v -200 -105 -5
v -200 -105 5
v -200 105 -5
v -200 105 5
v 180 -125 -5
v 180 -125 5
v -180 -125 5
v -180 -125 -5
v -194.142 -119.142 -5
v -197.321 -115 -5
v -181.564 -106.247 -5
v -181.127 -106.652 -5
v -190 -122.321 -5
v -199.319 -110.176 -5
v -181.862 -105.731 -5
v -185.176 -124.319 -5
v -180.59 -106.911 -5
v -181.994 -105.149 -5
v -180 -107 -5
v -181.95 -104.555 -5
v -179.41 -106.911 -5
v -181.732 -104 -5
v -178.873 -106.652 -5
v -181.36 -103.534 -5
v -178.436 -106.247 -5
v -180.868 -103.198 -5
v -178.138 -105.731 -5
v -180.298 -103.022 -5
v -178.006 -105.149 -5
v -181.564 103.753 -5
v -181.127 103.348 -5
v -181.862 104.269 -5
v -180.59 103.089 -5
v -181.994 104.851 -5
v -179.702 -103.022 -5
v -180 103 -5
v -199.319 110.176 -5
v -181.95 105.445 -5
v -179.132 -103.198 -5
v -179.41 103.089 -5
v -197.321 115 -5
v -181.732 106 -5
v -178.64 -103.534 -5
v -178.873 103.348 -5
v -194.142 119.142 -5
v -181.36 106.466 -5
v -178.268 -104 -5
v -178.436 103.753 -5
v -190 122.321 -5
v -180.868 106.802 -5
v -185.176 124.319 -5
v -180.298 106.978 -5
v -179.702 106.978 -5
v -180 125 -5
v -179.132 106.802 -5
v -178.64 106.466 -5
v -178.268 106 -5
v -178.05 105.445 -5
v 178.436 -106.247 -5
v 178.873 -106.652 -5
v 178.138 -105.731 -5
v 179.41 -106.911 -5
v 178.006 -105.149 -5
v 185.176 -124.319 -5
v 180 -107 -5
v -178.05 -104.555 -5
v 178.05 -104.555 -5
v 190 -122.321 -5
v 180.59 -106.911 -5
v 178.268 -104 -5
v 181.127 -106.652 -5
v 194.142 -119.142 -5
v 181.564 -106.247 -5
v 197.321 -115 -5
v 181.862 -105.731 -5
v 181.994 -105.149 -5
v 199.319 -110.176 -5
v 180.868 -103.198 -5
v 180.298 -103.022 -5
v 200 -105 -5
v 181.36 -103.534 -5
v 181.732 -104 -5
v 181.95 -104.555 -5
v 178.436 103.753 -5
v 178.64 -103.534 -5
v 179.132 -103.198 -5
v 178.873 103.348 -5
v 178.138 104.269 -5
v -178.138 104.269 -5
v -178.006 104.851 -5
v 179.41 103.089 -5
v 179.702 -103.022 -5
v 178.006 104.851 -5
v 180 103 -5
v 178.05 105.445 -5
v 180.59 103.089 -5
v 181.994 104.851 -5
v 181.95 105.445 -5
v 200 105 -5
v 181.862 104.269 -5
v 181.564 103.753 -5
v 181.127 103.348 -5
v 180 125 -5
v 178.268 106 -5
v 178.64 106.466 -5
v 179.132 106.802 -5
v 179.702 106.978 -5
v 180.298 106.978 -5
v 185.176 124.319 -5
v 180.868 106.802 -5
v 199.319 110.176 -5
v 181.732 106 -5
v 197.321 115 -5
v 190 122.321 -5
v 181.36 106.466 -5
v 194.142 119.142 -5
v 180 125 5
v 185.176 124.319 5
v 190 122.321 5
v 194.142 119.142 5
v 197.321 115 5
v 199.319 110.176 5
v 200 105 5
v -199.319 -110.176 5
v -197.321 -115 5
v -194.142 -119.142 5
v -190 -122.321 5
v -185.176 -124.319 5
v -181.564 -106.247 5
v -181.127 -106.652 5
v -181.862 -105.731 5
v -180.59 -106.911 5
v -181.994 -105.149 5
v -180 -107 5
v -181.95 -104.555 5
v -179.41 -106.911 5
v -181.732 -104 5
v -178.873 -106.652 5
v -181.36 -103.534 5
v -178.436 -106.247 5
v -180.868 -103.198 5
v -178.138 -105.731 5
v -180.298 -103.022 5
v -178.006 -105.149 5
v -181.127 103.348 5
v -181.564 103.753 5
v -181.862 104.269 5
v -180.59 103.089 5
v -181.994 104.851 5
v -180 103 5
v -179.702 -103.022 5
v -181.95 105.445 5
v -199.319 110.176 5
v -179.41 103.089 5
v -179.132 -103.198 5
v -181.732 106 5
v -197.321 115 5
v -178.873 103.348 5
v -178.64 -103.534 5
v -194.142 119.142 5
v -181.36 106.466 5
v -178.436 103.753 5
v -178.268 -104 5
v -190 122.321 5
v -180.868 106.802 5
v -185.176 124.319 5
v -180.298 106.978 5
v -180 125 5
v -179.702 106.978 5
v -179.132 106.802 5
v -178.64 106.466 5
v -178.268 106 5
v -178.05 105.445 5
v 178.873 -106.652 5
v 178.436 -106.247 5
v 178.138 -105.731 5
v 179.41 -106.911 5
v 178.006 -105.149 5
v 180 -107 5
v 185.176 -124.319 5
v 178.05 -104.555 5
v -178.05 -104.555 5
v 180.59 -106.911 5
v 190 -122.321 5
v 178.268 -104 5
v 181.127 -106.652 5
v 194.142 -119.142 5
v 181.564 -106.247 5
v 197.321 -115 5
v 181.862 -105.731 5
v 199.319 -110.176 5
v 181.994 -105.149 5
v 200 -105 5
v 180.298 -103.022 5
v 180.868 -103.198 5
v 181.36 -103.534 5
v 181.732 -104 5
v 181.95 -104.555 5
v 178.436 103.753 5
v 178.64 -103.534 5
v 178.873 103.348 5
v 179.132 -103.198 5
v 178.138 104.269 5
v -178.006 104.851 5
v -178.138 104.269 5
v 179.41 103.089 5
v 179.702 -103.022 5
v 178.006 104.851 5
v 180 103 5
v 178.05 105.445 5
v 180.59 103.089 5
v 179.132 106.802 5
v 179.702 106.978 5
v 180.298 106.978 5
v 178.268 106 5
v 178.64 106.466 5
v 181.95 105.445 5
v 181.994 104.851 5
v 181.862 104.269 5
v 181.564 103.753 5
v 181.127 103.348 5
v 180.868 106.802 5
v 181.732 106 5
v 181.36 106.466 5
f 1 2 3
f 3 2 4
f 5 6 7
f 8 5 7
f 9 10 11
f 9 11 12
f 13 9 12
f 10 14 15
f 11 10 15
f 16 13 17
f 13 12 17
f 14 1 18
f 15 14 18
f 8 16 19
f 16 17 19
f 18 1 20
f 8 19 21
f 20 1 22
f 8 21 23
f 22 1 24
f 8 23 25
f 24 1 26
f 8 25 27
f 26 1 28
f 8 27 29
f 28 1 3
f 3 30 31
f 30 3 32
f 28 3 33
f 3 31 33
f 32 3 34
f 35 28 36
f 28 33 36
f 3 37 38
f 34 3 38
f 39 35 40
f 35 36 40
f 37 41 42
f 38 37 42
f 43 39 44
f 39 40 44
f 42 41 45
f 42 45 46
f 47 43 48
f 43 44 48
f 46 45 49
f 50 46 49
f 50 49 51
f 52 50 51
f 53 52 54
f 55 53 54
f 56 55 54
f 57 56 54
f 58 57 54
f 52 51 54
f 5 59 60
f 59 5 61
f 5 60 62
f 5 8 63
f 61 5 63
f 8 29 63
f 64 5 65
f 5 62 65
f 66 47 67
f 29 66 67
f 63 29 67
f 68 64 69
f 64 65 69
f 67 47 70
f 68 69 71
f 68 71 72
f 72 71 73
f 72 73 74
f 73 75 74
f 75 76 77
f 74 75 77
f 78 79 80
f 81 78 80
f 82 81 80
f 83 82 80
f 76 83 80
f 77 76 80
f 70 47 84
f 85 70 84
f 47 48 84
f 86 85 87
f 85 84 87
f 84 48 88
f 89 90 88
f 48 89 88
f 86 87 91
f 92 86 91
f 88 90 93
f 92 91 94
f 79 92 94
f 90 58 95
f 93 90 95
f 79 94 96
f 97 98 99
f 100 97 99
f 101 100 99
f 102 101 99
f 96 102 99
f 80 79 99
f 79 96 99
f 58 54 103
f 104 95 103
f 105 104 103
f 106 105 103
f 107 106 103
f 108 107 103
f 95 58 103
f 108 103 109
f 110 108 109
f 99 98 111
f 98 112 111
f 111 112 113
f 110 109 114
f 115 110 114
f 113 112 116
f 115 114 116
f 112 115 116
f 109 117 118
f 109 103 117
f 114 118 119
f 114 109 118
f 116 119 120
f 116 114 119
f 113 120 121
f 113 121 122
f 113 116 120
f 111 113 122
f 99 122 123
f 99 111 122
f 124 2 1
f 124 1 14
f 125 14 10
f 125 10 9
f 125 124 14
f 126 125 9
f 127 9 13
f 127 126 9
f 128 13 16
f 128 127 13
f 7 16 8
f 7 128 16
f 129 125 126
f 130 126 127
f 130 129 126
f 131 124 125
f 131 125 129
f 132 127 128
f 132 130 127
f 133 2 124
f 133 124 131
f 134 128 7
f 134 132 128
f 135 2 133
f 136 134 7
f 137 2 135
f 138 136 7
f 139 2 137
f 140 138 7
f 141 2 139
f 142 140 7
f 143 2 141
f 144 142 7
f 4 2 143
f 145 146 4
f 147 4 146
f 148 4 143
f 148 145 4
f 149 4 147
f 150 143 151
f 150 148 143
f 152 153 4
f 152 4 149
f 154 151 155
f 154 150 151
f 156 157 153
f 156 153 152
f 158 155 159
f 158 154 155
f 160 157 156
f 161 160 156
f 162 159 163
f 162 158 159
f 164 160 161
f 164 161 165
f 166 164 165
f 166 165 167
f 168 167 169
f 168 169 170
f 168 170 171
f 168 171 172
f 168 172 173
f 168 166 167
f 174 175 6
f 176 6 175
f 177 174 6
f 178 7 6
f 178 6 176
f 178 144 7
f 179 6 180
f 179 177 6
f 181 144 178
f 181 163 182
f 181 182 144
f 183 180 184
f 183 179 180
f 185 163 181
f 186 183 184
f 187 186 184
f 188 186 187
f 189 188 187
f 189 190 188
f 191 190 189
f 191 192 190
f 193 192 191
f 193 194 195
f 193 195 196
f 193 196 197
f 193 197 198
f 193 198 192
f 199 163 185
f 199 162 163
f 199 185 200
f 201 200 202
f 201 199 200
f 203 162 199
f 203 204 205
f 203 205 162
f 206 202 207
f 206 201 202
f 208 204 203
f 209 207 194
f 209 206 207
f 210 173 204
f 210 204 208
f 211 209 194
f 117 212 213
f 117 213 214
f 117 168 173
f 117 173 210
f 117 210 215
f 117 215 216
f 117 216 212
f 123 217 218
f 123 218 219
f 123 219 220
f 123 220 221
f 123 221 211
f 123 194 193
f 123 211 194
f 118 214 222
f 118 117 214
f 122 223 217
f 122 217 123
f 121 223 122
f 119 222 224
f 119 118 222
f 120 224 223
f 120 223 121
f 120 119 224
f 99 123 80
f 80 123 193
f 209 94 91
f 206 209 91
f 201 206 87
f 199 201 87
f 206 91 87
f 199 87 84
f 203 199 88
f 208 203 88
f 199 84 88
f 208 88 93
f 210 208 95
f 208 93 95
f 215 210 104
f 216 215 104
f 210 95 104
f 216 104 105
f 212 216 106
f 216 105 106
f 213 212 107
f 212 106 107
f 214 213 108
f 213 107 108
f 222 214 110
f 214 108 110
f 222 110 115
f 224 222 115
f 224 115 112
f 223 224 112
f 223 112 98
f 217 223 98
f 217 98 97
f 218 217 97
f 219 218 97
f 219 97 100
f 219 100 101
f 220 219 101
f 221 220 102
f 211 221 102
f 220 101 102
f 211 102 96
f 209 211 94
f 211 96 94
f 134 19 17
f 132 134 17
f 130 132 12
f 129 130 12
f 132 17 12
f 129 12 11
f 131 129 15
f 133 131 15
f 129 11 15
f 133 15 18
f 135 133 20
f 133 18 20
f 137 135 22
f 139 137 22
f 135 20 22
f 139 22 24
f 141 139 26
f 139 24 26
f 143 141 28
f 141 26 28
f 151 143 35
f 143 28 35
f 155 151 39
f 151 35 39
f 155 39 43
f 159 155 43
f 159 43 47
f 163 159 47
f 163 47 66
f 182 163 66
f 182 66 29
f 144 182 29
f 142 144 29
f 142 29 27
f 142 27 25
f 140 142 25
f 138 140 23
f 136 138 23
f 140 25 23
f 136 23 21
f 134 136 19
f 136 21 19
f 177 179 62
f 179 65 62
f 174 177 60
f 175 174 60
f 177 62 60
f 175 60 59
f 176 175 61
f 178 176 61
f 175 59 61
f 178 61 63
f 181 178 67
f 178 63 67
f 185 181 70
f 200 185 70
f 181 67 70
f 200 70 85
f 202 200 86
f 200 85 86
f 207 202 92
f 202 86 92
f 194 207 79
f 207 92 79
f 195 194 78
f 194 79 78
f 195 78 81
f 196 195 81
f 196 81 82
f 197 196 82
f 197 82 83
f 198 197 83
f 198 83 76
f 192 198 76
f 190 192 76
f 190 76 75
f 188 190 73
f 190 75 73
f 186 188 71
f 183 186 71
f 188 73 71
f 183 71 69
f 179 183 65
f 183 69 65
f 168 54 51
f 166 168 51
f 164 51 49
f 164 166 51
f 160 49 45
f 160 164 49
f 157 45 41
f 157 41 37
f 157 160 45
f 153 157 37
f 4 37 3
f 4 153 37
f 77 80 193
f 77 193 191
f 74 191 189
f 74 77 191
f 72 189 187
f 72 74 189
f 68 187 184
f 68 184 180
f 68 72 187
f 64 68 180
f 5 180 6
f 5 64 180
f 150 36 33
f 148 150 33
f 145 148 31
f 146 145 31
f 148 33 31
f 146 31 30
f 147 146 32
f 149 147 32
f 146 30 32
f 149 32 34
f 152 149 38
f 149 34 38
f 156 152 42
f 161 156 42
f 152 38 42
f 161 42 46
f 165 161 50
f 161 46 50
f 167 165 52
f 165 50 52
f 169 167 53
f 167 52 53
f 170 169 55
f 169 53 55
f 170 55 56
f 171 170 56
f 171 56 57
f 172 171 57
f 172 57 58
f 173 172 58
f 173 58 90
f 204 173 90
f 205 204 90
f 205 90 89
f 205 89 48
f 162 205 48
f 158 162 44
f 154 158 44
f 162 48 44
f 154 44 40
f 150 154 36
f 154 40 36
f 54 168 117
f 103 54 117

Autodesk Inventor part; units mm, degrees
ref_plane "YZ Plane" through (0, 0, 0) normal (1, 0, 0) x (0, 1, 0)
ref_plane "XZ Plane" through (0, 0, 0) normal (0, 1, 0) x (-1, 0, 0)
ref_plane "XY Plane" through (0, 0, 0) normal (0, 0, 1) x (1, 0, 0)
sketch "Sketch1" plane through (0, 0, 0) normal (0, 0, 1) x (1, 0, 0)
  line L0 (-200, 125) -> (200, 125)
  line L1 (200, 125) -> (200, -125)
  line L2 (200, -125) -> (-200, -125)
  line L3 (-200, -125) -> (-200, 125)
  line L4 (-200, 125) -> (200, -125) construction
  line L5 (200, 125) -> (-200, -125) construction
  point P0 (0, 0)
  dimension "d0" = 400
  dimension "d1" = 250
extrude "Extrusion1" add sketch "Sketch1" against normal mid plane 10
fillet "Fillet1" radius 20 4 edges at (-200, -125, 0) (200, -125, 0) (200, 125, 0) (-200, 125, 0)
sketch "Sketch2" plane through (0, 0, 5) normal (0, 0, 1) x (1, 0, 0)
  arc A0 (-180, 125) -> (-200, 105) centre (-180, 105) ccw projected
  arc A1 (-200, -105) -> (-180, -125) centre (-180, -105) ccw projected
  arc A2 (180, -125) -> (200, -105) centre (180, -105) ccw projected
  arc A3 (200, 105) -> (180, 125) centre (180, 105) ccw projected
  point P0 (0, 0)
hole "Hole1" at (-180, 105, 5) at (180, 105, 5) at (180, -105, 5) at (-180, -105, 5) direction (0, 0, -1) diameter 4 end through all
properties part number "4103_Aluminum Box Bottom_V1" material "UHMW, White"
